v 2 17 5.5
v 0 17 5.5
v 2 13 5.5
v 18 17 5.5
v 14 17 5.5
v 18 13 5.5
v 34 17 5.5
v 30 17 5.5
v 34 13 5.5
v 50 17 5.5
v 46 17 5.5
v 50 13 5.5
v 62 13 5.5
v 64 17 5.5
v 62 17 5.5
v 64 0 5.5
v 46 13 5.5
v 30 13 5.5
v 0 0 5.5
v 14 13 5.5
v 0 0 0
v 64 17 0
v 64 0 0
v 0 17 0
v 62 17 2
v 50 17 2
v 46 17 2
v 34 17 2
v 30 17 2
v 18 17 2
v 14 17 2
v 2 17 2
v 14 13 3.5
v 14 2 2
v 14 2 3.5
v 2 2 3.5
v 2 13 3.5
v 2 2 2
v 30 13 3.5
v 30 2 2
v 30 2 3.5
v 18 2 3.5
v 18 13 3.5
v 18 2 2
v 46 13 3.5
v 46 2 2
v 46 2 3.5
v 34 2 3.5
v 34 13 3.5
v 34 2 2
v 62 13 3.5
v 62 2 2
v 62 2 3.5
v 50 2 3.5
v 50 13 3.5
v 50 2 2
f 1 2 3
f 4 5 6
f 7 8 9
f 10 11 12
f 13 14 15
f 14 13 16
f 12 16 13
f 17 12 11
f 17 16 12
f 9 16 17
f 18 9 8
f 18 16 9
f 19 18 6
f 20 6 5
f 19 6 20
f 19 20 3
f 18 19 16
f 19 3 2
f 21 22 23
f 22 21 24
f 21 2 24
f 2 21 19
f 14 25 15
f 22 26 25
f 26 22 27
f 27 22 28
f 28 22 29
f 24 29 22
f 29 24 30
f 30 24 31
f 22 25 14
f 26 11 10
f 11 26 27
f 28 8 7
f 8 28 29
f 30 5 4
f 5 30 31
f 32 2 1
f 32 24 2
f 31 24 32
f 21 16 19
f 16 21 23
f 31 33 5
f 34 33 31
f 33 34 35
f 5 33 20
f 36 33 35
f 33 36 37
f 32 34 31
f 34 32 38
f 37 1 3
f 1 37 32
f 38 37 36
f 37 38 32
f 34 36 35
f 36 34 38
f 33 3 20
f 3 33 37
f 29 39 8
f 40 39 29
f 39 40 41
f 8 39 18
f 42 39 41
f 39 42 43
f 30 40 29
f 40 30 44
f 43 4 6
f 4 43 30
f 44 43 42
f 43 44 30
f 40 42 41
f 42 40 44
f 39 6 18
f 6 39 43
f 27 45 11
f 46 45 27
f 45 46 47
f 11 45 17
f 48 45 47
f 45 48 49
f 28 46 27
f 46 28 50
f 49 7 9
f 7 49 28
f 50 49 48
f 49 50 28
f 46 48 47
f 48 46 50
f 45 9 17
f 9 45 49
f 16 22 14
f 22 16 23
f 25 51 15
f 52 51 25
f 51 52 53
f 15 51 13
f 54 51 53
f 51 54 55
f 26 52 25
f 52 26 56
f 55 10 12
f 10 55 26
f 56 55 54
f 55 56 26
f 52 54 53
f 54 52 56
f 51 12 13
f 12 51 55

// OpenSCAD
// This will generate a card holder per your specific dimensions in mm.
// Specify the following dimensions

// CardW, CardL, CardH, Wall, Count

// CardW: The Width of the slot for the card
// CardL: The lenght of the slot for the card
// CardH: The height of the slot for the card
// Wall: The thickness of the walls of the holder
// Count: How many holders do you want chained together.

CardHolder(12,15,1.5,2,4);

//Only mess with this is you know what you are doing.
module CardHolder(CardW,CardL,CardH,Wall,Count)
{
	HolderW = CardW + (Wall*2); //Holder Exterior Width
	HolderH = CardH + (Wall*2); //Holder Exterior Height
	HolderL = CardL + Wall; //Holder Exterior Length
	CutoutH = 5; //Front cutout Height, greater than slot to top
	CutoutL = 6; //The length of the cutout
	for (i=[0:Count-1])
	{
		translate([HolderW*i,0,0])difference()
		{
			cube([HolderW,HolderL,HolderH]);
			translate([Wall,Wall,Wall]) cube([CardW,CardL,CardH]);
			translate([Wall,CardL-Wall,Wall]) cube([CardW,CutoutL,CutoutH]);
		}
	}
}
